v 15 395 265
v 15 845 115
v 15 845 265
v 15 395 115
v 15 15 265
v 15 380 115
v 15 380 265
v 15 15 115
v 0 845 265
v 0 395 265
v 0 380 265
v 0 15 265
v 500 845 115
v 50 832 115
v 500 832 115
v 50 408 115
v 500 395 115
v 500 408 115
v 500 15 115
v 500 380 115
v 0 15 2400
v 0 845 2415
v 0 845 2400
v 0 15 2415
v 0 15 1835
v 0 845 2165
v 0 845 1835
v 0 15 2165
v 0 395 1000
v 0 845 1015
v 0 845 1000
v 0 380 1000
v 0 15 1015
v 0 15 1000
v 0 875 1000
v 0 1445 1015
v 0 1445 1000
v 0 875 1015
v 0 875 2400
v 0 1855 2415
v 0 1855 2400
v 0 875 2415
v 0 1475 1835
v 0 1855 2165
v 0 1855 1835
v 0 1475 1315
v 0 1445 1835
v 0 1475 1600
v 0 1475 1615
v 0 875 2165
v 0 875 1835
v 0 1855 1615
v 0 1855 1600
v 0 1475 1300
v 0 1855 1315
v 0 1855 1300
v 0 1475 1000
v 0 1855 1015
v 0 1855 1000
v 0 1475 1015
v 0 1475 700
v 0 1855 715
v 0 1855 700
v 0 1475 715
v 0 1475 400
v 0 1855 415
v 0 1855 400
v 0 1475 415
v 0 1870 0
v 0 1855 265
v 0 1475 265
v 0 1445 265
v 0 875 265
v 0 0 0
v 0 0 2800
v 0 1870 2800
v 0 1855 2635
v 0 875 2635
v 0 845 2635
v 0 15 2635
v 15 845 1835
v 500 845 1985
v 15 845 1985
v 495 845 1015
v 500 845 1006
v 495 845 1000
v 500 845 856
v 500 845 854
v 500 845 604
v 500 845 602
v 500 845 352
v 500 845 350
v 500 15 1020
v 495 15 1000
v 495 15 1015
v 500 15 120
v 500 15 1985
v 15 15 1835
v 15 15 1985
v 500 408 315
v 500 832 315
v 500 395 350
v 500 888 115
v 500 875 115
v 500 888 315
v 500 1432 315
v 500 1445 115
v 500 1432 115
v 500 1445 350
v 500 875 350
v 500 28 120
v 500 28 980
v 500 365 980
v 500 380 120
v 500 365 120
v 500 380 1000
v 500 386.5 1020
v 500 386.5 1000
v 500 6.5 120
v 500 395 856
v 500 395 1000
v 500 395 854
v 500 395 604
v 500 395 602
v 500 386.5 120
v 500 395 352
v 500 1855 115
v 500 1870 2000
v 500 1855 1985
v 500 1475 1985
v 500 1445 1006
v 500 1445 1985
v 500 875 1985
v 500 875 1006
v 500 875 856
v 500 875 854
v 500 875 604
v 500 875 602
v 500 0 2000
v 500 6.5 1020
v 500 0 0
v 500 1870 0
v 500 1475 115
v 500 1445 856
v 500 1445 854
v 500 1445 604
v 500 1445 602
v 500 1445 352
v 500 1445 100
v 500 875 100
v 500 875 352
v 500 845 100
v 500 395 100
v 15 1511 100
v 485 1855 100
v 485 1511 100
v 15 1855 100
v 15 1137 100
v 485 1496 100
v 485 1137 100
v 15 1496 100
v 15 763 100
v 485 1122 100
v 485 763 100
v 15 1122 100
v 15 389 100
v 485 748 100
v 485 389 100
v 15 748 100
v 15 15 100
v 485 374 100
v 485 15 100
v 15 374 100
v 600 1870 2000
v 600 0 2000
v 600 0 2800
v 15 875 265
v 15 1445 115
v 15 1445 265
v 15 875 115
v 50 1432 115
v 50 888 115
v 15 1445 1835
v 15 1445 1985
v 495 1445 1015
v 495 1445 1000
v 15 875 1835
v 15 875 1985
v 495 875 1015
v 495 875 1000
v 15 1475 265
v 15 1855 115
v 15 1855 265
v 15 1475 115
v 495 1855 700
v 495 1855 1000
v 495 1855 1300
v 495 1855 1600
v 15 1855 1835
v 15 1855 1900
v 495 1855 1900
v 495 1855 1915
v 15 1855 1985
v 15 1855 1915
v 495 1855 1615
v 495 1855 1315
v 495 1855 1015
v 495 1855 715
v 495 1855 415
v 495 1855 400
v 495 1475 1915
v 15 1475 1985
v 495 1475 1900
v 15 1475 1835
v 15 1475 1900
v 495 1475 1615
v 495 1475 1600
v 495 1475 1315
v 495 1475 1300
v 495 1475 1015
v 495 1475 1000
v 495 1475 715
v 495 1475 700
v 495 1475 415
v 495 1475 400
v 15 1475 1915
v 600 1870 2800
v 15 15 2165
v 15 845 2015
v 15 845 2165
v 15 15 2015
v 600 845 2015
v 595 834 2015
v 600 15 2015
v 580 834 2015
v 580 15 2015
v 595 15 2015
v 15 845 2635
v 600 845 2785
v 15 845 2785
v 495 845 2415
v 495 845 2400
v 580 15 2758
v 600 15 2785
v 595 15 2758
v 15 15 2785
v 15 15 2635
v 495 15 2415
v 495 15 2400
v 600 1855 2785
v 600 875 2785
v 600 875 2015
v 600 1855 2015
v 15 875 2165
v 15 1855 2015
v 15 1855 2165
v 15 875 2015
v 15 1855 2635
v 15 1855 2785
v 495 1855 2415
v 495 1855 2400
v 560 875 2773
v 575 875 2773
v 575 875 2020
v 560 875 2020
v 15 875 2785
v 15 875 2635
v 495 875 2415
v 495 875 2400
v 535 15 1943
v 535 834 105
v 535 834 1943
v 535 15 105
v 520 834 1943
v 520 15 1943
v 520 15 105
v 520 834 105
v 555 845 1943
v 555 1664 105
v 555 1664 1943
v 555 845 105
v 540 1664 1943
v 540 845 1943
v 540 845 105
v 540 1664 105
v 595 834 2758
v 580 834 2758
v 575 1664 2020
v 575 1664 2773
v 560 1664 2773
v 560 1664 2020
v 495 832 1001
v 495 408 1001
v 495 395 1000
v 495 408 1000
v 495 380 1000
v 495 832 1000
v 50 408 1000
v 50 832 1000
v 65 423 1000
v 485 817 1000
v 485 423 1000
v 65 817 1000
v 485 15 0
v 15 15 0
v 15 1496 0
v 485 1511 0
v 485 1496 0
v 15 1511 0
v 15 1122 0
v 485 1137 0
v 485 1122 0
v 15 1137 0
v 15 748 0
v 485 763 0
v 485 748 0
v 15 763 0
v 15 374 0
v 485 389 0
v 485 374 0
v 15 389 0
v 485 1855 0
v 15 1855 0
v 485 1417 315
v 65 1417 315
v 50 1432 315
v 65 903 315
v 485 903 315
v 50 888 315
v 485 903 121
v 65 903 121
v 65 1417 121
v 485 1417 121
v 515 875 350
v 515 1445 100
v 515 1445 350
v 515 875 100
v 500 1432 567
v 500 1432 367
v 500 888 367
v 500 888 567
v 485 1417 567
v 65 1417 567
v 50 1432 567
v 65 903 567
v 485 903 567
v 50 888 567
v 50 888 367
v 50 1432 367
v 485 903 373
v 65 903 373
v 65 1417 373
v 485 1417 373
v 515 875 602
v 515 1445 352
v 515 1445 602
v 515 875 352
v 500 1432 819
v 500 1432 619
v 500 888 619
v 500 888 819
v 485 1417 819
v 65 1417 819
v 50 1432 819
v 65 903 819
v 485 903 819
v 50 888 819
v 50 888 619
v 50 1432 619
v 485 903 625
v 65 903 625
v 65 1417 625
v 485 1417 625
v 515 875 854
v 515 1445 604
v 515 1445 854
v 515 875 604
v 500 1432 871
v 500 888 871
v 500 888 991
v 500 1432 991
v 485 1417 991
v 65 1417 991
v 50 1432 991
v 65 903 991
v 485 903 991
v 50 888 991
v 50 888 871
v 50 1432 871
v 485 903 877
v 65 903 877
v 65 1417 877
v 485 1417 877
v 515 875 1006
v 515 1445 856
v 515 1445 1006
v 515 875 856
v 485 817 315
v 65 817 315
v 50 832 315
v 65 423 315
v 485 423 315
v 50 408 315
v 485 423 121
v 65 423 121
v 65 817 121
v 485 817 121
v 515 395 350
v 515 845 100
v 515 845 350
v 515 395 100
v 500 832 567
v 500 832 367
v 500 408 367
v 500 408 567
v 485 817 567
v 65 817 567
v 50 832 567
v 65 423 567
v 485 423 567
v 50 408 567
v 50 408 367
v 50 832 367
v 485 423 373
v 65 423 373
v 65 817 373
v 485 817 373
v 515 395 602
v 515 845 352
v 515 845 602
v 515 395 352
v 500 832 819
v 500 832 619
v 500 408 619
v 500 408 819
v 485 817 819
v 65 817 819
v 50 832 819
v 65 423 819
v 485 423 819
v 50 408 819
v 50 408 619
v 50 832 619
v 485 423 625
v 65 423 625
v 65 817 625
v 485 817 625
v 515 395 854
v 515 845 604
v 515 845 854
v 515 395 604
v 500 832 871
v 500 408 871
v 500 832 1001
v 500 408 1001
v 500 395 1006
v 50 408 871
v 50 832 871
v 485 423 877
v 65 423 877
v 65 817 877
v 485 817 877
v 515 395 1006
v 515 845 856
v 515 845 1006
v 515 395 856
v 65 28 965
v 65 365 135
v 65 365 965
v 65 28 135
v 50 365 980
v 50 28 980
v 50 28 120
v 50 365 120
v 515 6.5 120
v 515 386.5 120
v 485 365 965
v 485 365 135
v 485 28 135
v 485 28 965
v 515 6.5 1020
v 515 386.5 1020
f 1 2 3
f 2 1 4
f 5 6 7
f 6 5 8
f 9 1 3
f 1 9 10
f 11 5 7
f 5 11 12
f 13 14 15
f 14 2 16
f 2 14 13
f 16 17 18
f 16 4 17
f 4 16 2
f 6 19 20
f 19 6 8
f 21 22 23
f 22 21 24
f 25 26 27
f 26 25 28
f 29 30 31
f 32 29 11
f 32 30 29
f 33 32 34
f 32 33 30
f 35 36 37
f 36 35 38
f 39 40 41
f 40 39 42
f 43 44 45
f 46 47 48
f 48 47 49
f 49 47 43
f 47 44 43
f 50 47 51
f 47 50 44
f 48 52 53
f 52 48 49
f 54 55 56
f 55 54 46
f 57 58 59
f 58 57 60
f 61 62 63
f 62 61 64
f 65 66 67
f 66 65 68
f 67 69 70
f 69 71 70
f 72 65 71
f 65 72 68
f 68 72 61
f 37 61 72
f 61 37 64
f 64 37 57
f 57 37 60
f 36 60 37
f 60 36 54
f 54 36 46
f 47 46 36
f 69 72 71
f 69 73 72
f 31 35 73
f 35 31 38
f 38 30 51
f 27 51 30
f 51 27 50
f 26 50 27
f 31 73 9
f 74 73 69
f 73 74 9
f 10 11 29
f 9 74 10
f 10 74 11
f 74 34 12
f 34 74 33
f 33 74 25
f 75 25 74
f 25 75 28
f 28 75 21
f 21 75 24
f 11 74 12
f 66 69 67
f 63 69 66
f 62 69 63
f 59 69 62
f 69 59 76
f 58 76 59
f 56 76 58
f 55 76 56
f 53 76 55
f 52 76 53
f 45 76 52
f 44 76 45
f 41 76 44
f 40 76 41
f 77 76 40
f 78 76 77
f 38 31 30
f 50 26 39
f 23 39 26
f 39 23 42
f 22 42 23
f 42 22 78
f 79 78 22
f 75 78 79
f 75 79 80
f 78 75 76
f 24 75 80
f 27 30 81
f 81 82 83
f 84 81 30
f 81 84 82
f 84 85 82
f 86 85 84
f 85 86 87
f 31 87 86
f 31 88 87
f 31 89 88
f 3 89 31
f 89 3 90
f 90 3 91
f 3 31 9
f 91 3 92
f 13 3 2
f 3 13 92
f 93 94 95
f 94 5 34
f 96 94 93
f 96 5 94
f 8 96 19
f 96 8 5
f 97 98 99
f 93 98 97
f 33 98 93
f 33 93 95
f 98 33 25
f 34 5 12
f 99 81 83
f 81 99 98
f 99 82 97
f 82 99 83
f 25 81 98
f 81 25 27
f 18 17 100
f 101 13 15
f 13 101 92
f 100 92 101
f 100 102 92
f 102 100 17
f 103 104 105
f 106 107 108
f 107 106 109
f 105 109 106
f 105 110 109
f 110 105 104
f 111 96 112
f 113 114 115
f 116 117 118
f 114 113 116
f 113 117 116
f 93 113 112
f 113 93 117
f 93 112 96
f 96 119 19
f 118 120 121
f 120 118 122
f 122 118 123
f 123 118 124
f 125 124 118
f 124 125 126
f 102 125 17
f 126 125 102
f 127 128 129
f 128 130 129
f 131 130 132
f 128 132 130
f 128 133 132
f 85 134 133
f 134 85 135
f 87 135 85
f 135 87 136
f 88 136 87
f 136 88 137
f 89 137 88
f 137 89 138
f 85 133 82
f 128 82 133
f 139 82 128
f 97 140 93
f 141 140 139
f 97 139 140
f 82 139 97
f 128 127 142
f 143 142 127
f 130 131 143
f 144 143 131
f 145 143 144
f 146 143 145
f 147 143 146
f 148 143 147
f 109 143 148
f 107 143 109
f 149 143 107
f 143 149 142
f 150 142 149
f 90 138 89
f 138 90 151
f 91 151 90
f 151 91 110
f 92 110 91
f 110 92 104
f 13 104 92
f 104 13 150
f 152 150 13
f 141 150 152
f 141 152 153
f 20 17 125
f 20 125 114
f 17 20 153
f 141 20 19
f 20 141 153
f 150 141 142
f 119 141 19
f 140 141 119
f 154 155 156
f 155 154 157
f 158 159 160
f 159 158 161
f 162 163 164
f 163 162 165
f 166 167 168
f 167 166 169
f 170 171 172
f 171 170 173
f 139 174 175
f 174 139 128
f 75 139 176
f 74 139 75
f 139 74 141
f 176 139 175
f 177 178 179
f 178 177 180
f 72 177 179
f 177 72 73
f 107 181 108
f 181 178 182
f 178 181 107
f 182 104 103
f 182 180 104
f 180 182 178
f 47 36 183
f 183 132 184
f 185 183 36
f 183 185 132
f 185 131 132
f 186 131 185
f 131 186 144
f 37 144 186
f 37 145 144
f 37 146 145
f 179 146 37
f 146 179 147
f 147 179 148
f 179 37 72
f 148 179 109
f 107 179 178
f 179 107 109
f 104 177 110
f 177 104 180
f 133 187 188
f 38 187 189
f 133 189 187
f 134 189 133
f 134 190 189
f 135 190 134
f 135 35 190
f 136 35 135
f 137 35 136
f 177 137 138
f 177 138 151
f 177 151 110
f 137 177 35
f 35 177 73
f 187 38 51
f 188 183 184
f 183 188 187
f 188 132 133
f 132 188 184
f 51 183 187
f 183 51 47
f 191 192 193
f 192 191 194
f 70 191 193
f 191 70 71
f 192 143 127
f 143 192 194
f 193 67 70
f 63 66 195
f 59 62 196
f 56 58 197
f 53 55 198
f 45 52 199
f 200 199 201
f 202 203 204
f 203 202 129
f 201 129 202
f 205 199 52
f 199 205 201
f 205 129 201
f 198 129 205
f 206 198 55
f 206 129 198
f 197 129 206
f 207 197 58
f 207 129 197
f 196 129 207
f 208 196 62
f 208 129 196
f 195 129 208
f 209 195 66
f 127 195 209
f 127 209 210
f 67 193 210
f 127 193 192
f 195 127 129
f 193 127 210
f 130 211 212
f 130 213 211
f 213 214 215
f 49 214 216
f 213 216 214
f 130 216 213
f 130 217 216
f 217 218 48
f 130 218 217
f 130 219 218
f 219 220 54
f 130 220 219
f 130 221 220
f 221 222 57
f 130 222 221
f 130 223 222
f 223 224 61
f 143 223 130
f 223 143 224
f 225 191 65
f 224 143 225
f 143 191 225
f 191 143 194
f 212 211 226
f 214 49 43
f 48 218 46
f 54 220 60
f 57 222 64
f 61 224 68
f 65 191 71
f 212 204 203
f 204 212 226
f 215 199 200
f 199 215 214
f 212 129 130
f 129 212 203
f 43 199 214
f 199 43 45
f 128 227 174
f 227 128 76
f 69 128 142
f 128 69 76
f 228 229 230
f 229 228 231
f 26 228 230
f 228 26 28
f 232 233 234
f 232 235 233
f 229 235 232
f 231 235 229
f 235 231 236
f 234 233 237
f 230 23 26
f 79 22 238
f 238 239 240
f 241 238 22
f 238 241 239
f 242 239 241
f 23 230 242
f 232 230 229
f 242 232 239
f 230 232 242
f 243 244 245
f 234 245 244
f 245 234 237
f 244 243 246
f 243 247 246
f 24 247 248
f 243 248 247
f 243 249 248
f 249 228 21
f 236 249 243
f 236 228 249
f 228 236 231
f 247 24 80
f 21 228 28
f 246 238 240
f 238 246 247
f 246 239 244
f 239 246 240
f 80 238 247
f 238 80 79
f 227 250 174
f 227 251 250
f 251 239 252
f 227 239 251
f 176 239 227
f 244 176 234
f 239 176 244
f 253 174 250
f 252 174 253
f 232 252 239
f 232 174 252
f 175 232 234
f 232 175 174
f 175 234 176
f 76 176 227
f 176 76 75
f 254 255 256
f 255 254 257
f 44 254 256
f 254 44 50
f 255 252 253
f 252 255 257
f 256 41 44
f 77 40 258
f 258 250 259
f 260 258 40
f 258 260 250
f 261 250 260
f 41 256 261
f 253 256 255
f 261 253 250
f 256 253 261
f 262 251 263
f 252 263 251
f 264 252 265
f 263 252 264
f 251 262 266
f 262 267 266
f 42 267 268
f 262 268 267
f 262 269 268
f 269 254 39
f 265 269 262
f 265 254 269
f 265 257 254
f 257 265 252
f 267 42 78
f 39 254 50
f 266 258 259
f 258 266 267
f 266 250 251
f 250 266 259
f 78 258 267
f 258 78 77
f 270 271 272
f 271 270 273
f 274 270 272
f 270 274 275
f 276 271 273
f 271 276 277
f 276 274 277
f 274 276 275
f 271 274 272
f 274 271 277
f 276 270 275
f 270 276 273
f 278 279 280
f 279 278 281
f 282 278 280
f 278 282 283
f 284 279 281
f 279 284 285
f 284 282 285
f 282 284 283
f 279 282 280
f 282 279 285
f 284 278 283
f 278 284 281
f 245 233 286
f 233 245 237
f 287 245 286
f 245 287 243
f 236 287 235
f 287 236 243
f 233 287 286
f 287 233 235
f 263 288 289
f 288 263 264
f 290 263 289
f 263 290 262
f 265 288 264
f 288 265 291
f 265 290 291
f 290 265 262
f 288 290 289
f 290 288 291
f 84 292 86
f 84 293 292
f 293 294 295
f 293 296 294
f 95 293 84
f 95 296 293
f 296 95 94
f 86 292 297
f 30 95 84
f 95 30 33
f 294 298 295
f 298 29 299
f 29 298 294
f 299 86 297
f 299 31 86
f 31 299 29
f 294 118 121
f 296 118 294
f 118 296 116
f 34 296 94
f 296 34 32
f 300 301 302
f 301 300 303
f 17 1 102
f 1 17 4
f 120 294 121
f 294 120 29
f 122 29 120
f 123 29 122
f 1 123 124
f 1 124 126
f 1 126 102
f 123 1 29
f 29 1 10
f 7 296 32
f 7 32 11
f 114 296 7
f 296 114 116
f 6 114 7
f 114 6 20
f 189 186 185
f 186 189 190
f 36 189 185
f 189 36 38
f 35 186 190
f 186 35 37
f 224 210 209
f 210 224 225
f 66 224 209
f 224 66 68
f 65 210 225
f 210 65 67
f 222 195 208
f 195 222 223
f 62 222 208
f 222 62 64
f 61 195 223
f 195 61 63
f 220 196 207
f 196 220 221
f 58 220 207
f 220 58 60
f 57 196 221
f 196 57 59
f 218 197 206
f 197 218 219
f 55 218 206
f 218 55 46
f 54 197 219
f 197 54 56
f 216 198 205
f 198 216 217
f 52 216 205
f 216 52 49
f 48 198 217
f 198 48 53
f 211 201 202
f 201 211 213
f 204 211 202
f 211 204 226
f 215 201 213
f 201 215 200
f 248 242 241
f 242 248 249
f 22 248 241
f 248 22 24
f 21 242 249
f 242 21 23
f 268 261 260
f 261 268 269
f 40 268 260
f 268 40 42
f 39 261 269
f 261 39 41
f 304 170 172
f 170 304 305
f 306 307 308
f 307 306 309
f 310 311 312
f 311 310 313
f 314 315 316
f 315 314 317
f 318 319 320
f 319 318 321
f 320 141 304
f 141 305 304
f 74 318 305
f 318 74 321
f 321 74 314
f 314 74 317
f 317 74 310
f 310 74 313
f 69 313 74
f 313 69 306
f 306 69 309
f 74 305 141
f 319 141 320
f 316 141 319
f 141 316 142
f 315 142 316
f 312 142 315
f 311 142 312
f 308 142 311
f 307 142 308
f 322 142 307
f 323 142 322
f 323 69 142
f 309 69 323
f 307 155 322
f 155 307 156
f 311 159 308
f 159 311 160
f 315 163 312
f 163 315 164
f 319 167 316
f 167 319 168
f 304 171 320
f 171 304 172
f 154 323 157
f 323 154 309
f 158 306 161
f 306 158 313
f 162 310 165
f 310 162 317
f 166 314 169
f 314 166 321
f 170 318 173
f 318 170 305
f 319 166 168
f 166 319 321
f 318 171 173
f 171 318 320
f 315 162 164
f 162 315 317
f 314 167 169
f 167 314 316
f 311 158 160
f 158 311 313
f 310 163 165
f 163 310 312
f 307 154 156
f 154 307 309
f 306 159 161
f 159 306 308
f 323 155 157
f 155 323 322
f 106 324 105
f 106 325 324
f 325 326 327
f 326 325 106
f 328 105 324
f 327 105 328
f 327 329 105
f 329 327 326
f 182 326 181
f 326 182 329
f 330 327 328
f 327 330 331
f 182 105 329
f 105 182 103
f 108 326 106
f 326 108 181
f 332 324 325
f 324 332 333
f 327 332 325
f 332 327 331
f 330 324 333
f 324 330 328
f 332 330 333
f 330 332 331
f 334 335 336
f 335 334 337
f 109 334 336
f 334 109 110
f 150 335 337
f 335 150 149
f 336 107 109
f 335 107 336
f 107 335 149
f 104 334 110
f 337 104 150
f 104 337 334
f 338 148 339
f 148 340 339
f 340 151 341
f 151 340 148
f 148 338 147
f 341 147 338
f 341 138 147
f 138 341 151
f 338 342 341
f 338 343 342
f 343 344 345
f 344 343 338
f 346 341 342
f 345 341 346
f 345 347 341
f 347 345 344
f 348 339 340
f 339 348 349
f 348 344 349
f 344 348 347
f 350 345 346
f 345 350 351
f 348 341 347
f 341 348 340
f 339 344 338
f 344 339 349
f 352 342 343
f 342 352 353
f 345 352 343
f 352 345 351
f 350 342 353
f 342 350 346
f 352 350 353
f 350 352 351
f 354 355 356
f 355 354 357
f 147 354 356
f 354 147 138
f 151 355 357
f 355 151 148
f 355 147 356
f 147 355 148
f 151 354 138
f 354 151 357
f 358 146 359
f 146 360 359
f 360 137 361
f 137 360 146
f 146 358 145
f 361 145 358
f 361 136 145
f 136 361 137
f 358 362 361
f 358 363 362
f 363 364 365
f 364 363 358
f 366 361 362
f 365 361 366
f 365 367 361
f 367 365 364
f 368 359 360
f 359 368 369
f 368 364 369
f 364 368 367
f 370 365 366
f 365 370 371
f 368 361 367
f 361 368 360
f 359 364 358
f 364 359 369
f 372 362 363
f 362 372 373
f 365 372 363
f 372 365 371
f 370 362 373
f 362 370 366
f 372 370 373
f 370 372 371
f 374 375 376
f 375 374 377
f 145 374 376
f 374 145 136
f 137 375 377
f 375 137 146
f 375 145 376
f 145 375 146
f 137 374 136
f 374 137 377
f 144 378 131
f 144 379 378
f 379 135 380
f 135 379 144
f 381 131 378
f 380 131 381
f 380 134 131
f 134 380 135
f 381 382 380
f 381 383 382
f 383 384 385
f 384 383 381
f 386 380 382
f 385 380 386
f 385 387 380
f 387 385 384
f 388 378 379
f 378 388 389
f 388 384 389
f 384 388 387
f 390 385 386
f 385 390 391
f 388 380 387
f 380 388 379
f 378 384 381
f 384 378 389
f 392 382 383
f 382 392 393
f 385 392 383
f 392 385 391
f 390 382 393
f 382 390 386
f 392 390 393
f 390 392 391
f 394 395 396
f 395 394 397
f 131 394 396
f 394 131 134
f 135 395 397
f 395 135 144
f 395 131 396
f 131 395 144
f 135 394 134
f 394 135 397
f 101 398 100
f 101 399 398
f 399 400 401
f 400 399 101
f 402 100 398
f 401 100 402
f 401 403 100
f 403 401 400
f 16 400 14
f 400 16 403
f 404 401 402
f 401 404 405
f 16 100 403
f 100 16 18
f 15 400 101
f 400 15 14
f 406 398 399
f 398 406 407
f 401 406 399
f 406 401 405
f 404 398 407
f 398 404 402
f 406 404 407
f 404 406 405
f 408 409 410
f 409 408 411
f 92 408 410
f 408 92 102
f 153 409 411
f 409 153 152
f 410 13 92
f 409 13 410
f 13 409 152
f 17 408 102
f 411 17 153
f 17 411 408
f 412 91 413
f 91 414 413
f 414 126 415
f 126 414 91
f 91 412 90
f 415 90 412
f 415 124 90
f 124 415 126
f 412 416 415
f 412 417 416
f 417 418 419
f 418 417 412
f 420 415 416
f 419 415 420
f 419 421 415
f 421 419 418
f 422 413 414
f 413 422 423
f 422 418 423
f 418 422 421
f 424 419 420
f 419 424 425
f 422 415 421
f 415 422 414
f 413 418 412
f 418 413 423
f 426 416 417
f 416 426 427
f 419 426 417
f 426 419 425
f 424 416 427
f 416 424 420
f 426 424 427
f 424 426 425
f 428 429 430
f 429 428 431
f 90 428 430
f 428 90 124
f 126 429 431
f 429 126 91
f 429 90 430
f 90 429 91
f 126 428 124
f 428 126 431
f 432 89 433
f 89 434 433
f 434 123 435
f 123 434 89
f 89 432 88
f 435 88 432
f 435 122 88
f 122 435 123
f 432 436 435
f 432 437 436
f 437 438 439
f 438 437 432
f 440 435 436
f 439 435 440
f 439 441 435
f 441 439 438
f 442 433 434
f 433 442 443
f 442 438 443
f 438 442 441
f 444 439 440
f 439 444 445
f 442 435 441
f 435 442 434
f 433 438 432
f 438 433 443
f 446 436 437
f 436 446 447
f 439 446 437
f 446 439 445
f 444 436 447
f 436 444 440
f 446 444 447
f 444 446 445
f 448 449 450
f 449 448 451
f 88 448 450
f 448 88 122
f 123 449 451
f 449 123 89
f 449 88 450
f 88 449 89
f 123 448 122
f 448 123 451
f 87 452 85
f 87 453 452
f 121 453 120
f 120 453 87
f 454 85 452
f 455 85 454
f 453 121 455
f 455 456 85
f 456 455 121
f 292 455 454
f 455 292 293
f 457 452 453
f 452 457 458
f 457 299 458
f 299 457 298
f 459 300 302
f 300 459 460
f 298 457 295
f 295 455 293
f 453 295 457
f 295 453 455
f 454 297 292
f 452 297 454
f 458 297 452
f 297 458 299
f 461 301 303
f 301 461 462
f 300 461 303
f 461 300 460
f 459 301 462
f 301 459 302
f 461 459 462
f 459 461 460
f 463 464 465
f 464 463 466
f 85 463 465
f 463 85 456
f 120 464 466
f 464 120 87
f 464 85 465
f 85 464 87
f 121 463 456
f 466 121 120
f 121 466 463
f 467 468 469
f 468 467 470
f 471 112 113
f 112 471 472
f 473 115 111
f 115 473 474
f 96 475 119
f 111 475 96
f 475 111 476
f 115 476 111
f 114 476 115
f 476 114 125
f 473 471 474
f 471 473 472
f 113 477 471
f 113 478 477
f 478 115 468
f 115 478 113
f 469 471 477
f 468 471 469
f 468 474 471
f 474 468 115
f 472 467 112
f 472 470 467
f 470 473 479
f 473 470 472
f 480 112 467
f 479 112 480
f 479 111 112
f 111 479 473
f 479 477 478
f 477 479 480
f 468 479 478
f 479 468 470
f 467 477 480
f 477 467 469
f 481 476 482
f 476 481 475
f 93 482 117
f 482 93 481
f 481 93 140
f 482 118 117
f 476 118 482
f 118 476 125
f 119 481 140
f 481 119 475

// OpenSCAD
use <cajoneriaLibV1.scad>
espesor = 15; riel = 13;
socalo = 100;
// modulo(i) = [
//    ancho, alto, profundidad,
//    refuerzo, esqueleto, fondo, espesor,
//    color, [x,y+sum(modulo(i..i-1)[ancho]),z], nombre
//]
// Modulos anchos sumados 1860
mod_00 = [860,1900,500,"No","No","No",espesor,"white",
         [0,0,socalo], "Modulo 1"];
mod_01 = [600,1900,500,"No","No","No",espesor,"white",
         [0,mod_00[0],socalo], "Modulo 2"];
mod_02 = [410,1900,500,"No","No","No",espesor,"white",
         [0,mod_00[0]+mod_01[0],socalo], "Modulo 3"];
         
         
mod_03 = [860,800,600,"No","No","No",espesor,"white",
         [0,0,socalo+mod_00[1]], "Modulo 1 sup"];
mod_04 = [860+150,800,600,"No","No","No",espesor,"white",
         [0,mod_03[0],socalo+mod_00[1]], "Modulo 2 sup"];


ModulosX = [mod_00, mod_01, mod_02, mod_03, mod_04 ];

// puerta = [moduloIndex, ancho, alto, cant, espesor, 
//    color, [x,y,z]], nombre
//]

puerta_00 = [0,mod_00[0]-26-15,
            mod_00[1]-32-30,1,
            espesor,"brown",
            [mod_00[8][0]+20+mod_00[2],
                mod_00[8][1]+15,
                mod_00[8][2]+5
                 ], 
            "puerta 1"];
puerta_01 = [1,mod_01[0]-26-15+(mod_02[0]-150),
            mod_01[1]-32-30,1,
            espesor,"brown",
            [mod_01[8][0]+40+mod_01[2],
                mod_01[8][1]-15,
                mod_01[8][2]+5], 
            "puerta 2"];
            
puerta_02 = [0,mod_03[0]-26-15,
            mod_03[1]-32-15,1,
            espesor,"brown",
            [mod_03[8][0]-20+mod_03[2],
                mod_03[8][1]+15,
                mod_03[8][2]+5], 
            "puerta 3"];
puerta_03 = [1,mod_04[0]-26-15-150 ,
            mod_04[1]-32-15,1,
            espesor,"brown",
            [mod_04[8][0]-40+mod_04[2],
                mod_04[8][1]-15,
                mod_04[8][2]+20], 
            "puerta 4"];
             
PuertasX = [
        puerta_00, puerta_01,
        puerta_02, puerta_03
    ];


div_00 = [0,mod_00[0]-10,mod_00[2]-5,1,espesor,"white",
            [mod_00[8][0],
                mod_00[8][1]+5,
                mod_00[8][2]+900], 
            "division 1 mod 1",
            "piso"];

div_01 = [0,mod_00[2],900,1,espesor,"white",
            [mod_00[8][0],
                mod_00[8][1]+380,
                mod_00[8][2]], 
            "division 2 mod 1",
            "lateral"];
            
div_02 = [1,mod_01[0]-10,mod_01[2]-5,1,espesor,"white",
            [mod_01[8][0],
                mod_01[8][1]+5,
                mod_01[8][2]+900], 
            "division 3 mod 2",
            "piso"];
Divisiones = [
            div_00, div_01,div_02
];

div_03 = [0,mod_02[0]-10,mod_02[2]-5,1,espesor,"white",
            [mod_02[8][0],
                mod_02[8][1]+5,
                mod_02[8][2]+300], 
            "division 4 mod 3",
            "piso"];
div_04 = [0,mod_02[0]-10,mod_02[2]-5,1,espesor,"white",
            [mod_02[8][0],
                mod_02[8][1]+5,
                mod_02[8][2]+600], 
            "division 5 mod 3",
            "piso"];

div_05 = [0,mod_02[0]-10,mod_02[2]-5,1,espesor,"white",
            [mod_02[8][0],
                mod_02[8][1]+5,
                mod_02[8][2]+900], 
            "division 6 mod 3",
            "piso"];

div_06 = [0,mod_02[0]-10,mod_02[2]-5,1,espesor,"white",
            [mod_02[8][0],
                mod_02[8][1]+5,
                mod_02[8][2]+1200], 
            "division 4 mod 3",
            "piso"];
            
div_07 = [0,mod_02[0]-10,mod_02[2]-5,1,espesor,"white",
            [mod_02[8][0],
                mod_02[8][1]+5,
                mod_02[8][2]+1500], 
            "division 5 mod 3",
            "piso"];

div_08 = [0,mod_02[0]-10,mod_02[2]-5,1,espesor,"white",
            [mod_02[8][0],
                mod_02[8][1]+5,
                mod_02[8][2]+1800], 
            "division 6 mod 3",
            "piso"];

div_09 = [0,mod_03[0]-10,mod_03[2]-5-100,1,espesor,"white",
            [mod_03[8][0],
                mod_03[8][1]+5,
                mod_03[8][2]+400], 
            "division 7 mod 4",
            "piso"];
div_10 = [0,mod_04[0]-10,mod_04[2]-5-100,1,espesor,"white",
            [mod_04[8][0],
                mod_04[8][1]+5,
                mod_04[8][2]+400], 
            "division 8 mod 5",
            "piso"];

Divisiones_01 = [
            div_03, div_04,div_05,
            div_06, div_07,div_08,
            div_09, div_10
];


//armario_00 = [moduloIndex, ancho, alto, profundidad,
//            espesor, color, divisiones, [x,y,z]];

armario_00 = [2, mod_00[0]-espesor*2, 500, mod_02[2]-espesor-6,
            espesor, "white", (1+1),
            [mod_00[8][0]+espesor*2,
                mod_00[8][1]+espesor,
                mod_00[8][2]+150],
            "Armario 1"];

socalo_00 = [0, 500, 1870, socalo,
            espesor, "brown", (4+2),
            [0,0,0],
            "Socalo 1"];

// cajon_00 = [moduloIndex, ancho, alto, profundidad,
//          espesor, color, frenteDec, anchoDec, altoDec, 
//          colorDec, [x,y,z]]


cajon_00 = [1, mod_01[0]-espesor*2-riel*2, 200, mod_01[2]-50,
          espesor, "white", "Si", mod_01[0]-espesor*2, 
          250,"yellow", 
          [mod_01[8][0]+50,
            mod_01[8][1]+espesor+riel,
            mod_01[8][2]+espesor]];
cajon_01 = [1, mod_01[0]-espesor*2-riel*2, 200, mod_01[2]-50,
          espesor, "white", "Si", mod_01[0]-espesor*2, 
          250,"yellow", 
          [mod_01[8][0]+50,
            mod_01[8][1]+espesor+riel,
            mod_01[8][2]+espesor+250+2]];
cajon_02 = [1, mod_01[0]-espesor*2-riel*2, 200, mod_01[2]-50,
          espesor, "white", "Si", mod_01[0]-espesor*2, 
          250,"yellow", 
          [mod_01[8][0]+50,
            mod_01[8][1]+espesor+riel,
            mod_01[8][2]+espesor+(250+2)*2]];
cajon_03 = [1, mod_01[0]-espesor*2-riel*2, 120, mod_01[2]-50,
          espesor, "white", "Si", mod_01[0]-espesor*2, 
          150,"yellow", 
          [mod_01[8][0]+50,
            mod_01[8][1]+espesor+riel,
            mod_01[8][2]+espesor+(250+2)*3]];            


CajonesX = [
    cajon_00, cajon_01, cajon_02, cajon_03
];

cajon_10 = [1, mod_00[0]-espesor*2-riel*2-380, 200, mod_00[2]-50,
          espesor, "white", "Si", mod_00[0]-espesor*2-380, 
          250,"yellow", 
          [mod_00[8][0]+50,
            mod_00[8][1]+espesor+riel+380,
            mod_00[8][2]+espesor]];
cajon_11 = [1, mod_00[0]-espesor*2-riel*2-380, 200, mod_00[2]-50,
          espesor, "white", "Si", mod_00[0]-espesor*2-380, 
          250,"yellow", 
          [mod_00[8][0]+50,
            mod_00[8][1]+espesor+riel+380,
            mod_00[8][2]+espesor+250+2]];
cajon_12 = [1, mod_00[0]-espesor*2-riel*2-380, 200, mod_00[2]-50,
          espesor, "white", "Si", mod_00[0]-espesor*2-380, 
          250,"yellow", 
          [mod_00[8][0]+50,
            mod_00[8][1]+espesor+riel+380,
            mod_00[8][2]+espesor+(250+2)*2]];
cajon_13 = [1, mod_00[0]-espesor*2-riel*2-380, 130, mod_00[2]-50,
          espesor, "white", "Si", mod_00[0]-espesor*2-380, 
          150,"yellow", 
          [mod_00[8][0]+50,
            mod_00[8][1]+espesor+riel+380,
            mod_00[8][2]+espesor+(250+2)*3]];

CajonesX_01 = [
    cajon_10, cajon_11, cajon_12, 
    cajon_13,
];

//CajonY = [anchoCajon=400, altoCajon=800, 
//            profundoCajon=500, 
//            espesor=15, color="green",
//            frente="Si",
//            altoFrente=815, anchoPlus=520,
//            colorFrente= "red"];
CajonY_01 = [380-13, 860, 450, 
            15, "white",
            "Si",
            900, 380,
            "white"];
modulosdeCocina(ModulosX);
puertasdeModulo(PuertasX);
divisiones(Divisiones); 
divisiones(Divisiones_01); 
socalo(socalo_00);
cajonesdeModulo(CajonesX);
cajonesdeModulo(CajonesX_01);

translate([50,+13,socalo+20])
cajonY(CajonY_01[0],CajonY_01[1],CajonY_01[2],
        CajonY_01[3],CajonY_01[4],CajonY_01[5],
        CajonY_01[6],CajonY_01[7],CajonY_01[8]
        );
        
